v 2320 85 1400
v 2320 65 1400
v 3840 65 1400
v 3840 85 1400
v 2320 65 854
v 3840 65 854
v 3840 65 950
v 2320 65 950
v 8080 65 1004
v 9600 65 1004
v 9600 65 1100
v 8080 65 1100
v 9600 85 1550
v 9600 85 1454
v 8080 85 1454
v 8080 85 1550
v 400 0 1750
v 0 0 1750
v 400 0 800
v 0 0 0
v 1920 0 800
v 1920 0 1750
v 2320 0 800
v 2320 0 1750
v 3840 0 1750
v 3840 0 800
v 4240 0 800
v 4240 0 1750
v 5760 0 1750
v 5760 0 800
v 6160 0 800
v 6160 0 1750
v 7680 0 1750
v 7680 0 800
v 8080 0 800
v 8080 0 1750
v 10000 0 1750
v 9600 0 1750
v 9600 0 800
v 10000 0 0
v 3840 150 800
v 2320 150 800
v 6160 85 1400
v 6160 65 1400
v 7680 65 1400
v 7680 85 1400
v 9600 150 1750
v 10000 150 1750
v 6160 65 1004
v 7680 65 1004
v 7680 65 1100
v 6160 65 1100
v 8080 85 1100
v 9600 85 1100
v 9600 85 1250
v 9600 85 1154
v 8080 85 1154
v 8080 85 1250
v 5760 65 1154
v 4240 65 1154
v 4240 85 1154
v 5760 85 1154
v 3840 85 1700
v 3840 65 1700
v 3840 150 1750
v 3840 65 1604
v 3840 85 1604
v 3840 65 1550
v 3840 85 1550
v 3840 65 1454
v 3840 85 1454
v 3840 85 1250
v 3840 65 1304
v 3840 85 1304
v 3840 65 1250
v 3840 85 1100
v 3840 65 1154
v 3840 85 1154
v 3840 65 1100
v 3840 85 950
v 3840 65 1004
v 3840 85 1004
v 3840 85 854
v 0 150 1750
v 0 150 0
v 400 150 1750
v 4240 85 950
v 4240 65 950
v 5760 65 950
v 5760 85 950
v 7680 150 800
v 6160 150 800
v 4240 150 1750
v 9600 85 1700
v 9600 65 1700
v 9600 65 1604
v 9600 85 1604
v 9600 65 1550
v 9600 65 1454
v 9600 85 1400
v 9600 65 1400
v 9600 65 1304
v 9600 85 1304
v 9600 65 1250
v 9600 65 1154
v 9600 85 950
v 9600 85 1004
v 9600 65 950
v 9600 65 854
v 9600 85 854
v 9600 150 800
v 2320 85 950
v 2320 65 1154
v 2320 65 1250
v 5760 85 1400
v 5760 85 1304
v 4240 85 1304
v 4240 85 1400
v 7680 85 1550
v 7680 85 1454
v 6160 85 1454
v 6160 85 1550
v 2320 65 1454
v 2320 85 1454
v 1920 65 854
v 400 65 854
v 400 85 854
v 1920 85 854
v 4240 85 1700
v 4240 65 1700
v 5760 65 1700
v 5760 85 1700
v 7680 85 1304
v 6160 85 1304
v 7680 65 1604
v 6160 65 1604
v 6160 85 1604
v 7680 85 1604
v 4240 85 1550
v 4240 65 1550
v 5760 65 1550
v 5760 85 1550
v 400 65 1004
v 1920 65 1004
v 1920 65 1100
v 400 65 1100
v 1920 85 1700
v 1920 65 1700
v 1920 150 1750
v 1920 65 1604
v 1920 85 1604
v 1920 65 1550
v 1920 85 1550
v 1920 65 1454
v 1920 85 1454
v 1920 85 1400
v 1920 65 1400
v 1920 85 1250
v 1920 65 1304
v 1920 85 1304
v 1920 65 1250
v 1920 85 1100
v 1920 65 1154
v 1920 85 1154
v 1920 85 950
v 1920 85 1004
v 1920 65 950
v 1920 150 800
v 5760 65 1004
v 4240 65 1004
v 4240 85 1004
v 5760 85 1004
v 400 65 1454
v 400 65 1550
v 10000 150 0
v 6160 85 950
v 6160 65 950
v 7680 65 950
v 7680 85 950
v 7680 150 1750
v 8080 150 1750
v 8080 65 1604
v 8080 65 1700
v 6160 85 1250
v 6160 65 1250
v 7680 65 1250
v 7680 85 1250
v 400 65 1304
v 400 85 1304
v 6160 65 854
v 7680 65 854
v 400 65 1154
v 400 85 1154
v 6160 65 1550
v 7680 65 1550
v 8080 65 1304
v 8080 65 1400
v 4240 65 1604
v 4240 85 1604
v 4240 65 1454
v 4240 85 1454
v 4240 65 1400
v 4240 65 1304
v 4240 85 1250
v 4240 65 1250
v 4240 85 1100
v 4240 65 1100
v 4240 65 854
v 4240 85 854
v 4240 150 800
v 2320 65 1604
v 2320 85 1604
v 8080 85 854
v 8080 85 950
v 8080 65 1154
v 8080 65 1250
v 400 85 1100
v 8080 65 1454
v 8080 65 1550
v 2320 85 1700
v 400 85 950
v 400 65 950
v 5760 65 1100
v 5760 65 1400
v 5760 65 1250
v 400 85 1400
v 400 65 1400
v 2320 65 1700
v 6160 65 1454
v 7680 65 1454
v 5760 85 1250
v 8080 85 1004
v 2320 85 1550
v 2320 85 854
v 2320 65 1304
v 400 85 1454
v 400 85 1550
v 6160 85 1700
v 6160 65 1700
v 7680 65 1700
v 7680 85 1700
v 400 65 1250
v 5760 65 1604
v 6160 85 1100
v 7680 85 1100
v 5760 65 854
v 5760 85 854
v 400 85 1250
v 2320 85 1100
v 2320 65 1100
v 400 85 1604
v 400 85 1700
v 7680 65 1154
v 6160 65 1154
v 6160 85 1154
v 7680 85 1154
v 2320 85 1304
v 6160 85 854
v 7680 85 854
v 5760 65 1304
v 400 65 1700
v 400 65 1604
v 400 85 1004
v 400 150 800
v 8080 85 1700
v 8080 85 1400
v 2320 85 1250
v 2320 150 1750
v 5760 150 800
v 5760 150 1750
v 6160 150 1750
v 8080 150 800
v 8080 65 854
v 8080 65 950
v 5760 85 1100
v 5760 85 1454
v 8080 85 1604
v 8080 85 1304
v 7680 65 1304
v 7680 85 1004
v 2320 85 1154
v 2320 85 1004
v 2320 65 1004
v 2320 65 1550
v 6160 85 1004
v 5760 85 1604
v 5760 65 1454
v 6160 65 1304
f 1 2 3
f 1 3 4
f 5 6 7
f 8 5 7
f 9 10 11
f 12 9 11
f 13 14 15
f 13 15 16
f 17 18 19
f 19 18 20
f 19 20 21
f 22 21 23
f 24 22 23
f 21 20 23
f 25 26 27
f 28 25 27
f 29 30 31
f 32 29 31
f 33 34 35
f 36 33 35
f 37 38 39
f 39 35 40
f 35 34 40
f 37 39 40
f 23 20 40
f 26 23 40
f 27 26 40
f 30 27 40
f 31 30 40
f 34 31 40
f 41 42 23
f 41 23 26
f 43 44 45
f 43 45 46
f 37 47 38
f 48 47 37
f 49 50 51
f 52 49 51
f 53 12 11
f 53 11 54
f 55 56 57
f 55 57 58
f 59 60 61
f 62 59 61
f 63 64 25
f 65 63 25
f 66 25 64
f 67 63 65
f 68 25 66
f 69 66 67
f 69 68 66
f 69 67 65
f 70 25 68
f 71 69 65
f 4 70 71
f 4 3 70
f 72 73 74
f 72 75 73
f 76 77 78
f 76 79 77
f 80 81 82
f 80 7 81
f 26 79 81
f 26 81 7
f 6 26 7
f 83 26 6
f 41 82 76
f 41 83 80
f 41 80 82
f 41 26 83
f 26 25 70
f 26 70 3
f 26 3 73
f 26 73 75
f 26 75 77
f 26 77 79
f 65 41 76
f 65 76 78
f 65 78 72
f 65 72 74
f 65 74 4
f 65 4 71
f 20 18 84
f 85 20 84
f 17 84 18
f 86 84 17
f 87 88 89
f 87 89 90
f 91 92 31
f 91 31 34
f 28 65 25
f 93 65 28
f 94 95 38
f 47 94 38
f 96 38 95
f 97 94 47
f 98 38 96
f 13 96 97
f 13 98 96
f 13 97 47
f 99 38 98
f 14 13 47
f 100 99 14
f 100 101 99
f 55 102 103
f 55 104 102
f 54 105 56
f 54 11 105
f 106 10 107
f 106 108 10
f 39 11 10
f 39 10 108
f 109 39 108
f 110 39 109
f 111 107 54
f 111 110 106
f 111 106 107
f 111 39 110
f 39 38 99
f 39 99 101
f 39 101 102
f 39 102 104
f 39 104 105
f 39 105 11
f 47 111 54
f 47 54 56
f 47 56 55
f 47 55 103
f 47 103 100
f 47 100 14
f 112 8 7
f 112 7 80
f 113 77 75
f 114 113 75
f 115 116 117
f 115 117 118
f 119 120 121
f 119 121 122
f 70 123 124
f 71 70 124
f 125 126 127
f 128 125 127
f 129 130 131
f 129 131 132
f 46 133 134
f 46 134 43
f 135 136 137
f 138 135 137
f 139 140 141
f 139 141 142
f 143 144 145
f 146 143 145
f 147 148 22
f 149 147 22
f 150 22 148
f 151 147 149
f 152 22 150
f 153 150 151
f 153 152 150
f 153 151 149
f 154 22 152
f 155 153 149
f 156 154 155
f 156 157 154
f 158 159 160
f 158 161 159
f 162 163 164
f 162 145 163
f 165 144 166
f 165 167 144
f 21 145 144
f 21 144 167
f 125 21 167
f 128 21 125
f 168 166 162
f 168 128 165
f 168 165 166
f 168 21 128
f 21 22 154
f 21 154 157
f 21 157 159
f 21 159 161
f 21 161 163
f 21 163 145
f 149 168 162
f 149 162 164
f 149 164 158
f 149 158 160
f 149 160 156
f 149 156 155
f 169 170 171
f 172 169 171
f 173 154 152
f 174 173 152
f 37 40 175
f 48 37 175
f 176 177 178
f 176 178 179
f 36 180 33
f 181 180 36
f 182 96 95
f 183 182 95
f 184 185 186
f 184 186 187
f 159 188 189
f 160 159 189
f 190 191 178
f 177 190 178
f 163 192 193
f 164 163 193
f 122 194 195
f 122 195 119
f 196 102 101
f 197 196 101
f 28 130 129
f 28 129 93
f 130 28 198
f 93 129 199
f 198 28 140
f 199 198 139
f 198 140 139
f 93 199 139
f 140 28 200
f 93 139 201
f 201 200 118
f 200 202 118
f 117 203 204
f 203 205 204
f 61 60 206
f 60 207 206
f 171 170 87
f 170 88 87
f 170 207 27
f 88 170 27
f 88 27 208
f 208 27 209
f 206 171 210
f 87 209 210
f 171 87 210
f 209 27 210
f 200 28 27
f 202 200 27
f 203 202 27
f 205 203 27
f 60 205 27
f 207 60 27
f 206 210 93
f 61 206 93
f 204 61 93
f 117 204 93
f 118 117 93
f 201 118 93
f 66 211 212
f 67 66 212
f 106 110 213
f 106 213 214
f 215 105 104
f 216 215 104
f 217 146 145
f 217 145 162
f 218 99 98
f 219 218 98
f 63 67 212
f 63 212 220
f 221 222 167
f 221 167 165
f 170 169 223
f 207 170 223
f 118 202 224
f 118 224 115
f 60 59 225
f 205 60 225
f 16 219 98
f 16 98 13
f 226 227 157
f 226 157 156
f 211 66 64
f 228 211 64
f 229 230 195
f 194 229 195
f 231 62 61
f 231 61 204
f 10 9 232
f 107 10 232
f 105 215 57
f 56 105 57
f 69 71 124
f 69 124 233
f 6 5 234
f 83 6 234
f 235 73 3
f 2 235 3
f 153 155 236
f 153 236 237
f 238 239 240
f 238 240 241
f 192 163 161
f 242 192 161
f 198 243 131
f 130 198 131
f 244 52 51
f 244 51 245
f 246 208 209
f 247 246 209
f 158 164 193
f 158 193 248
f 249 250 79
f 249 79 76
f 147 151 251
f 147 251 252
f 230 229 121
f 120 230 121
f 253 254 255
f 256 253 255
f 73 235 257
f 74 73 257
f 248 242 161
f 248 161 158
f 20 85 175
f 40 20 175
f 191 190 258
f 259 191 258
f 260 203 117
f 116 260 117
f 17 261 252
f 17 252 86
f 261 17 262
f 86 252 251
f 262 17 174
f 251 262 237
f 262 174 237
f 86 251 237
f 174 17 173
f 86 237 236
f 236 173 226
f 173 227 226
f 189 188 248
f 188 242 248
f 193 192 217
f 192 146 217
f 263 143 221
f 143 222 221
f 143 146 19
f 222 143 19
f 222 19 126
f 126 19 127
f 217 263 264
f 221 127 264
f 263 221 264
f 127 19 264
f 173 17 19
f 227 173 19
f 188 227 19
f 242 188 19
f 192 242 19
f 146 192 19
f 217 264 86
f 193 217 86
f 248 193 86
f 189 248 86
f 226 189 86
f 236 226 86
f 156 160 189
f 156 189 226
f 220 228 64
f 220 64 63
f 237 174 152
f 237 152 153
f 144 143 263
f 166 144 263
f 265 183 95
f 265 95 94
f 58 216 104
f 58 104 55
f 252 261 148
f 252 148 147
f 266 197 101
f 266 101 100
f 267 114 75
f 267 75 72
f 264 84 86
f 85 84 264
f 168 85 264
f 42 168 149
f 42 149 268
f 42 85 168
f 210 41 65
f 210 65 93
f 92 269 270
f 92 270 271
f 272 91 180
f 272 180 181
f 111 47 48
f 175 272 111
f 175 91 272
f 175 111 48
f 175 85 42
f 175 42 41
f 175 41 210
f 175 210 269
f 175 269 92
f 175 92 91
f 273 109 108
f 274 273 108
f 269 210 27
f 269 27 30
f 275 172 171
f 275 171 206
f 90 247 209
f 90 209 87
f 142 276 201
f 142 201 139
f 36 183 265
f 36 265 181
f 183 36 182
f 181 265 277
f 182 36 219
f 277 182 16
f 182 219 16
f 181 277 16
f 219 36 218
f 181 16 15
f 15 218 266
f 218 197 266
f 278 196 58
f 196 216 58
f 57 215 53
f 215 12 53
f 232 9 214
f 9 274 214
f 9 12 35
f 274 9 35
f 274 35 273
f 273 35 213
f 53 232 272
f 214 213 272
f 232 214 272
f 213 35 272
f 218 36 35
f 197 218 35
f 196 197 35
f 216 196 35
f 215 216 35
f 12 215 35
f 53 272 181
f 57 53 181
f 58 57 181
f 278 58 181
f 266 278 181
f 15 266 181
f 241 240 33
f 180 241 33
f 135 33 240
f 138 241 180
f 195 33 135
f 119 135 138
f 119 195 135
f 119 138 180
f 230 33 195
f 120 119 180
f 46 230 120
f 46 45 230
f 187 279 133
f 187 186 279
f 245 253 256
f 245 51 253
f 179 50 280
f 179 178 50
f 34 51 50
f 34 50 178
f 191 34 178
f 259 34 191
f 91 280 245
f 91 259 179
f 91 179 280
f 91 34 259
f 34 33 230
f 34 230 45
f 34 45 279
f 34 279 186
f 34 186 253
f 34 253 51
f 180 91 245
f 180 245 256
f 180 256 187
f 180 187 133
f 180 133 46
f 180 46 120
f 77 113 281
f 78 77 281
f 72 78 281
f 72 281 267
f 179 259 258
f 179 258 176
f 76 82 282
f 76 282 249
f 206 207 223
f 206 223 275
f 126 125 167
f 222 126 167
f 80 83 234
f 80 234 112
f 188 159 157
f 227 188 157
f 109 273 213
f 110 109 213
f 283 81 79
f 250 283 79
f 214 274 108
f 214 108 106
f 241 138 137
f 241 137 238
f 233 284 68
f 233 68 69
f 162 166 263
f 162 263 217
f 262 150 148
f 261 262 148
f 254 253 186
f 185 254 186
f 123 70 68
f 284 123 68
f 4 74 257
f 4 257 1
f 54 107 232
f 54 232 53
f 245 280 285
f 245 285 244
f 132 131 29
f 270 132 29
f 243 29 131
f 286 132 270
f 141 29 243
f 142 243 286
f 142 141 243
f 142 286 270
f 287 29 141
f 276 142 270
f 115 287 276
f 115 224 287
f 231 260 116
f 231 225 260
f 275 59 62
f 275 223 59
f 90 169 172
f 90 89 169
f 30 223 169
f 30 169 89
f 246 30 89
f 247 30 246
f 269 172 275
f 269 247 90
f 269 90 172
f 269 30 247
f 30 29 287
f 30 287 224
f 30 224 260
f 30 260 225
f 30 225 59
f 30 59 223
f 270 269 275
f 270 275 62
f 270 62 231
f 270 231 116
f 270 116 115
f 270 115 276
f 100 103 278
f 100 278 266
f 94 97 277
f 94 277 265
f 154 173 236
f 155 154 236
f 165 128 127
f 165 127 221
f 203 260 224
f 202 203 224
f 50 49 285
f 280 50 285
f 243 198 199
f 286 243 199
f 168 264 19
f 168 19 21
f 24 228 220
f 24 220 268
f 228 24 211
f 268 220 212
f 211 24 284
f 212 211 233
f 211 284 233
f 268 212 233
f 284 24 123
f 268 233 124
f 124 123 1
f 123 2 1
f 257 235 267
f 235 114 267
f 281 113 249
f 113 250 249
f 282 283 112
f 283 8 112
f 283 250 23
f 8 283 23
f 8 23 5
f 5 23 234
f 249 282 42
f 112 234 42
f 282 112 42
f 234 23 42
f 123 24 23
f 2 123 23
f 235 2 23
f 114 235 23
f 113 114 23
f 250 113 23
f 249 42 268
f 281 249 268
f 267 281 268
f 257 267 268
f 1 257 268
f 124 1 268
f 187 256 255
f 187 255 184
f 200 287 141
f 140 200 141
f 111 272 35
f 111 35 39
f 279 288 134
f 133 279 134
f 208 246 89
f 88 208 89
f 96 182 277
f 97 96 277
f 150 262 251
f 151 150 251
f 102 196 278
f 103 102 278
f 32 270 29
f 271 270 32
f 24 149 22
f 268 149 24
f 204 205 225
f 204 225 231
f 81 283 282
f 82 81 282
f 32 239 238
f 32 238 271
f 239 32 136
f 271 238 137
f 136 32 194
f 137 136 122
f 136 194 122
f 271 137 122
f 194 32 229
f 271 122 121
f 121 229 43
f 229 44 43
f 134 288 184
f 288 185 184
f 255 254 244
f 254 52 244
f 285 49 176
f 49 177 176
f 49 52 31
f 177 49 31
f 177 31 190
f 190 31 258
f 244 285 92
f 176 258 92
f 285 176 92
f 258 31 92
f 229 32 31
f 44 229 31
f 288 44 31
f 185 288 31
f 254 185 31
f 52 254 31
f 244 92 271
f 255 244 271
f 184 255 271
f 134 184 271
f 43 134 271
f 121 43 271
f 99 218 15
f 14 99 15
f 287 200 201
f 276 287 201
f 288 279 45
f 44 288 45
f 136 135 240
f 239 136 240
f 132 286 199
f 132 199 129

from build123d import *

# Parameters (mm, degrees)
F2_W     = 10000
F2_H     = 150
F3_DEPTH = 800
F4_W     = 400
F4_H     = 150
F5_DEPTH = 1750
F6_W     = 20
F6_H     = 96
F7_DEPTH = 10000


with BuildPart() as f3:
    # F2 (on Top) → F3 (new body, through all)
    with BuildSketch(Plane.XY):
        with Locations((5000, 75)):
            Rectangle(F2_W, F2_H)
    extrude(amount=F3_DEPTH)

    # F4 (on Top) → F5 (join, through all)
    with BuildSketch(Plane.XY):
        with Locations((200, 75)):
            Rectangle(F4_W, F4_H)
        with Locations((2120, 75)):
            Rectangle(F4_W, F4_H)
        with Locations((4040, 75)):
            Rectangle(F4_W, F4_H)
        with Locations((5960, 75)):
            Rectangle(F4_W, F4_H)
        with Locations((7880, 75)):
            Rectangle(F4_W, F4_H)
        with Locations((9800, 75)):
            Rectangle(F4_W, F4_H)
    extrude(amount=F5_DEPTH)

    # F6 (on Right) → F7 (join, through all)
    with BuildSketch(Plane.YZ):
        with Locations((75, 1652)):
            Rectangle(F6_W, F6_H)
        with Locations((75, 1502)):
            Rectangle(F6_W, F6_H)
        with Locations((75, 1352)):
            Rectangle(F6_W, F6_H)
        with Locations((75, 1202)):
            Rectangle(F6_W, F6_H)
        with Locations((75, 1052)):
            Rectangle(F6_W, F6_H)
        with Locations((75, 902)):
            Rectangle(F6_W, F6_H)
    extrude(amount=F7_DEPTH)


solid = f3.part
